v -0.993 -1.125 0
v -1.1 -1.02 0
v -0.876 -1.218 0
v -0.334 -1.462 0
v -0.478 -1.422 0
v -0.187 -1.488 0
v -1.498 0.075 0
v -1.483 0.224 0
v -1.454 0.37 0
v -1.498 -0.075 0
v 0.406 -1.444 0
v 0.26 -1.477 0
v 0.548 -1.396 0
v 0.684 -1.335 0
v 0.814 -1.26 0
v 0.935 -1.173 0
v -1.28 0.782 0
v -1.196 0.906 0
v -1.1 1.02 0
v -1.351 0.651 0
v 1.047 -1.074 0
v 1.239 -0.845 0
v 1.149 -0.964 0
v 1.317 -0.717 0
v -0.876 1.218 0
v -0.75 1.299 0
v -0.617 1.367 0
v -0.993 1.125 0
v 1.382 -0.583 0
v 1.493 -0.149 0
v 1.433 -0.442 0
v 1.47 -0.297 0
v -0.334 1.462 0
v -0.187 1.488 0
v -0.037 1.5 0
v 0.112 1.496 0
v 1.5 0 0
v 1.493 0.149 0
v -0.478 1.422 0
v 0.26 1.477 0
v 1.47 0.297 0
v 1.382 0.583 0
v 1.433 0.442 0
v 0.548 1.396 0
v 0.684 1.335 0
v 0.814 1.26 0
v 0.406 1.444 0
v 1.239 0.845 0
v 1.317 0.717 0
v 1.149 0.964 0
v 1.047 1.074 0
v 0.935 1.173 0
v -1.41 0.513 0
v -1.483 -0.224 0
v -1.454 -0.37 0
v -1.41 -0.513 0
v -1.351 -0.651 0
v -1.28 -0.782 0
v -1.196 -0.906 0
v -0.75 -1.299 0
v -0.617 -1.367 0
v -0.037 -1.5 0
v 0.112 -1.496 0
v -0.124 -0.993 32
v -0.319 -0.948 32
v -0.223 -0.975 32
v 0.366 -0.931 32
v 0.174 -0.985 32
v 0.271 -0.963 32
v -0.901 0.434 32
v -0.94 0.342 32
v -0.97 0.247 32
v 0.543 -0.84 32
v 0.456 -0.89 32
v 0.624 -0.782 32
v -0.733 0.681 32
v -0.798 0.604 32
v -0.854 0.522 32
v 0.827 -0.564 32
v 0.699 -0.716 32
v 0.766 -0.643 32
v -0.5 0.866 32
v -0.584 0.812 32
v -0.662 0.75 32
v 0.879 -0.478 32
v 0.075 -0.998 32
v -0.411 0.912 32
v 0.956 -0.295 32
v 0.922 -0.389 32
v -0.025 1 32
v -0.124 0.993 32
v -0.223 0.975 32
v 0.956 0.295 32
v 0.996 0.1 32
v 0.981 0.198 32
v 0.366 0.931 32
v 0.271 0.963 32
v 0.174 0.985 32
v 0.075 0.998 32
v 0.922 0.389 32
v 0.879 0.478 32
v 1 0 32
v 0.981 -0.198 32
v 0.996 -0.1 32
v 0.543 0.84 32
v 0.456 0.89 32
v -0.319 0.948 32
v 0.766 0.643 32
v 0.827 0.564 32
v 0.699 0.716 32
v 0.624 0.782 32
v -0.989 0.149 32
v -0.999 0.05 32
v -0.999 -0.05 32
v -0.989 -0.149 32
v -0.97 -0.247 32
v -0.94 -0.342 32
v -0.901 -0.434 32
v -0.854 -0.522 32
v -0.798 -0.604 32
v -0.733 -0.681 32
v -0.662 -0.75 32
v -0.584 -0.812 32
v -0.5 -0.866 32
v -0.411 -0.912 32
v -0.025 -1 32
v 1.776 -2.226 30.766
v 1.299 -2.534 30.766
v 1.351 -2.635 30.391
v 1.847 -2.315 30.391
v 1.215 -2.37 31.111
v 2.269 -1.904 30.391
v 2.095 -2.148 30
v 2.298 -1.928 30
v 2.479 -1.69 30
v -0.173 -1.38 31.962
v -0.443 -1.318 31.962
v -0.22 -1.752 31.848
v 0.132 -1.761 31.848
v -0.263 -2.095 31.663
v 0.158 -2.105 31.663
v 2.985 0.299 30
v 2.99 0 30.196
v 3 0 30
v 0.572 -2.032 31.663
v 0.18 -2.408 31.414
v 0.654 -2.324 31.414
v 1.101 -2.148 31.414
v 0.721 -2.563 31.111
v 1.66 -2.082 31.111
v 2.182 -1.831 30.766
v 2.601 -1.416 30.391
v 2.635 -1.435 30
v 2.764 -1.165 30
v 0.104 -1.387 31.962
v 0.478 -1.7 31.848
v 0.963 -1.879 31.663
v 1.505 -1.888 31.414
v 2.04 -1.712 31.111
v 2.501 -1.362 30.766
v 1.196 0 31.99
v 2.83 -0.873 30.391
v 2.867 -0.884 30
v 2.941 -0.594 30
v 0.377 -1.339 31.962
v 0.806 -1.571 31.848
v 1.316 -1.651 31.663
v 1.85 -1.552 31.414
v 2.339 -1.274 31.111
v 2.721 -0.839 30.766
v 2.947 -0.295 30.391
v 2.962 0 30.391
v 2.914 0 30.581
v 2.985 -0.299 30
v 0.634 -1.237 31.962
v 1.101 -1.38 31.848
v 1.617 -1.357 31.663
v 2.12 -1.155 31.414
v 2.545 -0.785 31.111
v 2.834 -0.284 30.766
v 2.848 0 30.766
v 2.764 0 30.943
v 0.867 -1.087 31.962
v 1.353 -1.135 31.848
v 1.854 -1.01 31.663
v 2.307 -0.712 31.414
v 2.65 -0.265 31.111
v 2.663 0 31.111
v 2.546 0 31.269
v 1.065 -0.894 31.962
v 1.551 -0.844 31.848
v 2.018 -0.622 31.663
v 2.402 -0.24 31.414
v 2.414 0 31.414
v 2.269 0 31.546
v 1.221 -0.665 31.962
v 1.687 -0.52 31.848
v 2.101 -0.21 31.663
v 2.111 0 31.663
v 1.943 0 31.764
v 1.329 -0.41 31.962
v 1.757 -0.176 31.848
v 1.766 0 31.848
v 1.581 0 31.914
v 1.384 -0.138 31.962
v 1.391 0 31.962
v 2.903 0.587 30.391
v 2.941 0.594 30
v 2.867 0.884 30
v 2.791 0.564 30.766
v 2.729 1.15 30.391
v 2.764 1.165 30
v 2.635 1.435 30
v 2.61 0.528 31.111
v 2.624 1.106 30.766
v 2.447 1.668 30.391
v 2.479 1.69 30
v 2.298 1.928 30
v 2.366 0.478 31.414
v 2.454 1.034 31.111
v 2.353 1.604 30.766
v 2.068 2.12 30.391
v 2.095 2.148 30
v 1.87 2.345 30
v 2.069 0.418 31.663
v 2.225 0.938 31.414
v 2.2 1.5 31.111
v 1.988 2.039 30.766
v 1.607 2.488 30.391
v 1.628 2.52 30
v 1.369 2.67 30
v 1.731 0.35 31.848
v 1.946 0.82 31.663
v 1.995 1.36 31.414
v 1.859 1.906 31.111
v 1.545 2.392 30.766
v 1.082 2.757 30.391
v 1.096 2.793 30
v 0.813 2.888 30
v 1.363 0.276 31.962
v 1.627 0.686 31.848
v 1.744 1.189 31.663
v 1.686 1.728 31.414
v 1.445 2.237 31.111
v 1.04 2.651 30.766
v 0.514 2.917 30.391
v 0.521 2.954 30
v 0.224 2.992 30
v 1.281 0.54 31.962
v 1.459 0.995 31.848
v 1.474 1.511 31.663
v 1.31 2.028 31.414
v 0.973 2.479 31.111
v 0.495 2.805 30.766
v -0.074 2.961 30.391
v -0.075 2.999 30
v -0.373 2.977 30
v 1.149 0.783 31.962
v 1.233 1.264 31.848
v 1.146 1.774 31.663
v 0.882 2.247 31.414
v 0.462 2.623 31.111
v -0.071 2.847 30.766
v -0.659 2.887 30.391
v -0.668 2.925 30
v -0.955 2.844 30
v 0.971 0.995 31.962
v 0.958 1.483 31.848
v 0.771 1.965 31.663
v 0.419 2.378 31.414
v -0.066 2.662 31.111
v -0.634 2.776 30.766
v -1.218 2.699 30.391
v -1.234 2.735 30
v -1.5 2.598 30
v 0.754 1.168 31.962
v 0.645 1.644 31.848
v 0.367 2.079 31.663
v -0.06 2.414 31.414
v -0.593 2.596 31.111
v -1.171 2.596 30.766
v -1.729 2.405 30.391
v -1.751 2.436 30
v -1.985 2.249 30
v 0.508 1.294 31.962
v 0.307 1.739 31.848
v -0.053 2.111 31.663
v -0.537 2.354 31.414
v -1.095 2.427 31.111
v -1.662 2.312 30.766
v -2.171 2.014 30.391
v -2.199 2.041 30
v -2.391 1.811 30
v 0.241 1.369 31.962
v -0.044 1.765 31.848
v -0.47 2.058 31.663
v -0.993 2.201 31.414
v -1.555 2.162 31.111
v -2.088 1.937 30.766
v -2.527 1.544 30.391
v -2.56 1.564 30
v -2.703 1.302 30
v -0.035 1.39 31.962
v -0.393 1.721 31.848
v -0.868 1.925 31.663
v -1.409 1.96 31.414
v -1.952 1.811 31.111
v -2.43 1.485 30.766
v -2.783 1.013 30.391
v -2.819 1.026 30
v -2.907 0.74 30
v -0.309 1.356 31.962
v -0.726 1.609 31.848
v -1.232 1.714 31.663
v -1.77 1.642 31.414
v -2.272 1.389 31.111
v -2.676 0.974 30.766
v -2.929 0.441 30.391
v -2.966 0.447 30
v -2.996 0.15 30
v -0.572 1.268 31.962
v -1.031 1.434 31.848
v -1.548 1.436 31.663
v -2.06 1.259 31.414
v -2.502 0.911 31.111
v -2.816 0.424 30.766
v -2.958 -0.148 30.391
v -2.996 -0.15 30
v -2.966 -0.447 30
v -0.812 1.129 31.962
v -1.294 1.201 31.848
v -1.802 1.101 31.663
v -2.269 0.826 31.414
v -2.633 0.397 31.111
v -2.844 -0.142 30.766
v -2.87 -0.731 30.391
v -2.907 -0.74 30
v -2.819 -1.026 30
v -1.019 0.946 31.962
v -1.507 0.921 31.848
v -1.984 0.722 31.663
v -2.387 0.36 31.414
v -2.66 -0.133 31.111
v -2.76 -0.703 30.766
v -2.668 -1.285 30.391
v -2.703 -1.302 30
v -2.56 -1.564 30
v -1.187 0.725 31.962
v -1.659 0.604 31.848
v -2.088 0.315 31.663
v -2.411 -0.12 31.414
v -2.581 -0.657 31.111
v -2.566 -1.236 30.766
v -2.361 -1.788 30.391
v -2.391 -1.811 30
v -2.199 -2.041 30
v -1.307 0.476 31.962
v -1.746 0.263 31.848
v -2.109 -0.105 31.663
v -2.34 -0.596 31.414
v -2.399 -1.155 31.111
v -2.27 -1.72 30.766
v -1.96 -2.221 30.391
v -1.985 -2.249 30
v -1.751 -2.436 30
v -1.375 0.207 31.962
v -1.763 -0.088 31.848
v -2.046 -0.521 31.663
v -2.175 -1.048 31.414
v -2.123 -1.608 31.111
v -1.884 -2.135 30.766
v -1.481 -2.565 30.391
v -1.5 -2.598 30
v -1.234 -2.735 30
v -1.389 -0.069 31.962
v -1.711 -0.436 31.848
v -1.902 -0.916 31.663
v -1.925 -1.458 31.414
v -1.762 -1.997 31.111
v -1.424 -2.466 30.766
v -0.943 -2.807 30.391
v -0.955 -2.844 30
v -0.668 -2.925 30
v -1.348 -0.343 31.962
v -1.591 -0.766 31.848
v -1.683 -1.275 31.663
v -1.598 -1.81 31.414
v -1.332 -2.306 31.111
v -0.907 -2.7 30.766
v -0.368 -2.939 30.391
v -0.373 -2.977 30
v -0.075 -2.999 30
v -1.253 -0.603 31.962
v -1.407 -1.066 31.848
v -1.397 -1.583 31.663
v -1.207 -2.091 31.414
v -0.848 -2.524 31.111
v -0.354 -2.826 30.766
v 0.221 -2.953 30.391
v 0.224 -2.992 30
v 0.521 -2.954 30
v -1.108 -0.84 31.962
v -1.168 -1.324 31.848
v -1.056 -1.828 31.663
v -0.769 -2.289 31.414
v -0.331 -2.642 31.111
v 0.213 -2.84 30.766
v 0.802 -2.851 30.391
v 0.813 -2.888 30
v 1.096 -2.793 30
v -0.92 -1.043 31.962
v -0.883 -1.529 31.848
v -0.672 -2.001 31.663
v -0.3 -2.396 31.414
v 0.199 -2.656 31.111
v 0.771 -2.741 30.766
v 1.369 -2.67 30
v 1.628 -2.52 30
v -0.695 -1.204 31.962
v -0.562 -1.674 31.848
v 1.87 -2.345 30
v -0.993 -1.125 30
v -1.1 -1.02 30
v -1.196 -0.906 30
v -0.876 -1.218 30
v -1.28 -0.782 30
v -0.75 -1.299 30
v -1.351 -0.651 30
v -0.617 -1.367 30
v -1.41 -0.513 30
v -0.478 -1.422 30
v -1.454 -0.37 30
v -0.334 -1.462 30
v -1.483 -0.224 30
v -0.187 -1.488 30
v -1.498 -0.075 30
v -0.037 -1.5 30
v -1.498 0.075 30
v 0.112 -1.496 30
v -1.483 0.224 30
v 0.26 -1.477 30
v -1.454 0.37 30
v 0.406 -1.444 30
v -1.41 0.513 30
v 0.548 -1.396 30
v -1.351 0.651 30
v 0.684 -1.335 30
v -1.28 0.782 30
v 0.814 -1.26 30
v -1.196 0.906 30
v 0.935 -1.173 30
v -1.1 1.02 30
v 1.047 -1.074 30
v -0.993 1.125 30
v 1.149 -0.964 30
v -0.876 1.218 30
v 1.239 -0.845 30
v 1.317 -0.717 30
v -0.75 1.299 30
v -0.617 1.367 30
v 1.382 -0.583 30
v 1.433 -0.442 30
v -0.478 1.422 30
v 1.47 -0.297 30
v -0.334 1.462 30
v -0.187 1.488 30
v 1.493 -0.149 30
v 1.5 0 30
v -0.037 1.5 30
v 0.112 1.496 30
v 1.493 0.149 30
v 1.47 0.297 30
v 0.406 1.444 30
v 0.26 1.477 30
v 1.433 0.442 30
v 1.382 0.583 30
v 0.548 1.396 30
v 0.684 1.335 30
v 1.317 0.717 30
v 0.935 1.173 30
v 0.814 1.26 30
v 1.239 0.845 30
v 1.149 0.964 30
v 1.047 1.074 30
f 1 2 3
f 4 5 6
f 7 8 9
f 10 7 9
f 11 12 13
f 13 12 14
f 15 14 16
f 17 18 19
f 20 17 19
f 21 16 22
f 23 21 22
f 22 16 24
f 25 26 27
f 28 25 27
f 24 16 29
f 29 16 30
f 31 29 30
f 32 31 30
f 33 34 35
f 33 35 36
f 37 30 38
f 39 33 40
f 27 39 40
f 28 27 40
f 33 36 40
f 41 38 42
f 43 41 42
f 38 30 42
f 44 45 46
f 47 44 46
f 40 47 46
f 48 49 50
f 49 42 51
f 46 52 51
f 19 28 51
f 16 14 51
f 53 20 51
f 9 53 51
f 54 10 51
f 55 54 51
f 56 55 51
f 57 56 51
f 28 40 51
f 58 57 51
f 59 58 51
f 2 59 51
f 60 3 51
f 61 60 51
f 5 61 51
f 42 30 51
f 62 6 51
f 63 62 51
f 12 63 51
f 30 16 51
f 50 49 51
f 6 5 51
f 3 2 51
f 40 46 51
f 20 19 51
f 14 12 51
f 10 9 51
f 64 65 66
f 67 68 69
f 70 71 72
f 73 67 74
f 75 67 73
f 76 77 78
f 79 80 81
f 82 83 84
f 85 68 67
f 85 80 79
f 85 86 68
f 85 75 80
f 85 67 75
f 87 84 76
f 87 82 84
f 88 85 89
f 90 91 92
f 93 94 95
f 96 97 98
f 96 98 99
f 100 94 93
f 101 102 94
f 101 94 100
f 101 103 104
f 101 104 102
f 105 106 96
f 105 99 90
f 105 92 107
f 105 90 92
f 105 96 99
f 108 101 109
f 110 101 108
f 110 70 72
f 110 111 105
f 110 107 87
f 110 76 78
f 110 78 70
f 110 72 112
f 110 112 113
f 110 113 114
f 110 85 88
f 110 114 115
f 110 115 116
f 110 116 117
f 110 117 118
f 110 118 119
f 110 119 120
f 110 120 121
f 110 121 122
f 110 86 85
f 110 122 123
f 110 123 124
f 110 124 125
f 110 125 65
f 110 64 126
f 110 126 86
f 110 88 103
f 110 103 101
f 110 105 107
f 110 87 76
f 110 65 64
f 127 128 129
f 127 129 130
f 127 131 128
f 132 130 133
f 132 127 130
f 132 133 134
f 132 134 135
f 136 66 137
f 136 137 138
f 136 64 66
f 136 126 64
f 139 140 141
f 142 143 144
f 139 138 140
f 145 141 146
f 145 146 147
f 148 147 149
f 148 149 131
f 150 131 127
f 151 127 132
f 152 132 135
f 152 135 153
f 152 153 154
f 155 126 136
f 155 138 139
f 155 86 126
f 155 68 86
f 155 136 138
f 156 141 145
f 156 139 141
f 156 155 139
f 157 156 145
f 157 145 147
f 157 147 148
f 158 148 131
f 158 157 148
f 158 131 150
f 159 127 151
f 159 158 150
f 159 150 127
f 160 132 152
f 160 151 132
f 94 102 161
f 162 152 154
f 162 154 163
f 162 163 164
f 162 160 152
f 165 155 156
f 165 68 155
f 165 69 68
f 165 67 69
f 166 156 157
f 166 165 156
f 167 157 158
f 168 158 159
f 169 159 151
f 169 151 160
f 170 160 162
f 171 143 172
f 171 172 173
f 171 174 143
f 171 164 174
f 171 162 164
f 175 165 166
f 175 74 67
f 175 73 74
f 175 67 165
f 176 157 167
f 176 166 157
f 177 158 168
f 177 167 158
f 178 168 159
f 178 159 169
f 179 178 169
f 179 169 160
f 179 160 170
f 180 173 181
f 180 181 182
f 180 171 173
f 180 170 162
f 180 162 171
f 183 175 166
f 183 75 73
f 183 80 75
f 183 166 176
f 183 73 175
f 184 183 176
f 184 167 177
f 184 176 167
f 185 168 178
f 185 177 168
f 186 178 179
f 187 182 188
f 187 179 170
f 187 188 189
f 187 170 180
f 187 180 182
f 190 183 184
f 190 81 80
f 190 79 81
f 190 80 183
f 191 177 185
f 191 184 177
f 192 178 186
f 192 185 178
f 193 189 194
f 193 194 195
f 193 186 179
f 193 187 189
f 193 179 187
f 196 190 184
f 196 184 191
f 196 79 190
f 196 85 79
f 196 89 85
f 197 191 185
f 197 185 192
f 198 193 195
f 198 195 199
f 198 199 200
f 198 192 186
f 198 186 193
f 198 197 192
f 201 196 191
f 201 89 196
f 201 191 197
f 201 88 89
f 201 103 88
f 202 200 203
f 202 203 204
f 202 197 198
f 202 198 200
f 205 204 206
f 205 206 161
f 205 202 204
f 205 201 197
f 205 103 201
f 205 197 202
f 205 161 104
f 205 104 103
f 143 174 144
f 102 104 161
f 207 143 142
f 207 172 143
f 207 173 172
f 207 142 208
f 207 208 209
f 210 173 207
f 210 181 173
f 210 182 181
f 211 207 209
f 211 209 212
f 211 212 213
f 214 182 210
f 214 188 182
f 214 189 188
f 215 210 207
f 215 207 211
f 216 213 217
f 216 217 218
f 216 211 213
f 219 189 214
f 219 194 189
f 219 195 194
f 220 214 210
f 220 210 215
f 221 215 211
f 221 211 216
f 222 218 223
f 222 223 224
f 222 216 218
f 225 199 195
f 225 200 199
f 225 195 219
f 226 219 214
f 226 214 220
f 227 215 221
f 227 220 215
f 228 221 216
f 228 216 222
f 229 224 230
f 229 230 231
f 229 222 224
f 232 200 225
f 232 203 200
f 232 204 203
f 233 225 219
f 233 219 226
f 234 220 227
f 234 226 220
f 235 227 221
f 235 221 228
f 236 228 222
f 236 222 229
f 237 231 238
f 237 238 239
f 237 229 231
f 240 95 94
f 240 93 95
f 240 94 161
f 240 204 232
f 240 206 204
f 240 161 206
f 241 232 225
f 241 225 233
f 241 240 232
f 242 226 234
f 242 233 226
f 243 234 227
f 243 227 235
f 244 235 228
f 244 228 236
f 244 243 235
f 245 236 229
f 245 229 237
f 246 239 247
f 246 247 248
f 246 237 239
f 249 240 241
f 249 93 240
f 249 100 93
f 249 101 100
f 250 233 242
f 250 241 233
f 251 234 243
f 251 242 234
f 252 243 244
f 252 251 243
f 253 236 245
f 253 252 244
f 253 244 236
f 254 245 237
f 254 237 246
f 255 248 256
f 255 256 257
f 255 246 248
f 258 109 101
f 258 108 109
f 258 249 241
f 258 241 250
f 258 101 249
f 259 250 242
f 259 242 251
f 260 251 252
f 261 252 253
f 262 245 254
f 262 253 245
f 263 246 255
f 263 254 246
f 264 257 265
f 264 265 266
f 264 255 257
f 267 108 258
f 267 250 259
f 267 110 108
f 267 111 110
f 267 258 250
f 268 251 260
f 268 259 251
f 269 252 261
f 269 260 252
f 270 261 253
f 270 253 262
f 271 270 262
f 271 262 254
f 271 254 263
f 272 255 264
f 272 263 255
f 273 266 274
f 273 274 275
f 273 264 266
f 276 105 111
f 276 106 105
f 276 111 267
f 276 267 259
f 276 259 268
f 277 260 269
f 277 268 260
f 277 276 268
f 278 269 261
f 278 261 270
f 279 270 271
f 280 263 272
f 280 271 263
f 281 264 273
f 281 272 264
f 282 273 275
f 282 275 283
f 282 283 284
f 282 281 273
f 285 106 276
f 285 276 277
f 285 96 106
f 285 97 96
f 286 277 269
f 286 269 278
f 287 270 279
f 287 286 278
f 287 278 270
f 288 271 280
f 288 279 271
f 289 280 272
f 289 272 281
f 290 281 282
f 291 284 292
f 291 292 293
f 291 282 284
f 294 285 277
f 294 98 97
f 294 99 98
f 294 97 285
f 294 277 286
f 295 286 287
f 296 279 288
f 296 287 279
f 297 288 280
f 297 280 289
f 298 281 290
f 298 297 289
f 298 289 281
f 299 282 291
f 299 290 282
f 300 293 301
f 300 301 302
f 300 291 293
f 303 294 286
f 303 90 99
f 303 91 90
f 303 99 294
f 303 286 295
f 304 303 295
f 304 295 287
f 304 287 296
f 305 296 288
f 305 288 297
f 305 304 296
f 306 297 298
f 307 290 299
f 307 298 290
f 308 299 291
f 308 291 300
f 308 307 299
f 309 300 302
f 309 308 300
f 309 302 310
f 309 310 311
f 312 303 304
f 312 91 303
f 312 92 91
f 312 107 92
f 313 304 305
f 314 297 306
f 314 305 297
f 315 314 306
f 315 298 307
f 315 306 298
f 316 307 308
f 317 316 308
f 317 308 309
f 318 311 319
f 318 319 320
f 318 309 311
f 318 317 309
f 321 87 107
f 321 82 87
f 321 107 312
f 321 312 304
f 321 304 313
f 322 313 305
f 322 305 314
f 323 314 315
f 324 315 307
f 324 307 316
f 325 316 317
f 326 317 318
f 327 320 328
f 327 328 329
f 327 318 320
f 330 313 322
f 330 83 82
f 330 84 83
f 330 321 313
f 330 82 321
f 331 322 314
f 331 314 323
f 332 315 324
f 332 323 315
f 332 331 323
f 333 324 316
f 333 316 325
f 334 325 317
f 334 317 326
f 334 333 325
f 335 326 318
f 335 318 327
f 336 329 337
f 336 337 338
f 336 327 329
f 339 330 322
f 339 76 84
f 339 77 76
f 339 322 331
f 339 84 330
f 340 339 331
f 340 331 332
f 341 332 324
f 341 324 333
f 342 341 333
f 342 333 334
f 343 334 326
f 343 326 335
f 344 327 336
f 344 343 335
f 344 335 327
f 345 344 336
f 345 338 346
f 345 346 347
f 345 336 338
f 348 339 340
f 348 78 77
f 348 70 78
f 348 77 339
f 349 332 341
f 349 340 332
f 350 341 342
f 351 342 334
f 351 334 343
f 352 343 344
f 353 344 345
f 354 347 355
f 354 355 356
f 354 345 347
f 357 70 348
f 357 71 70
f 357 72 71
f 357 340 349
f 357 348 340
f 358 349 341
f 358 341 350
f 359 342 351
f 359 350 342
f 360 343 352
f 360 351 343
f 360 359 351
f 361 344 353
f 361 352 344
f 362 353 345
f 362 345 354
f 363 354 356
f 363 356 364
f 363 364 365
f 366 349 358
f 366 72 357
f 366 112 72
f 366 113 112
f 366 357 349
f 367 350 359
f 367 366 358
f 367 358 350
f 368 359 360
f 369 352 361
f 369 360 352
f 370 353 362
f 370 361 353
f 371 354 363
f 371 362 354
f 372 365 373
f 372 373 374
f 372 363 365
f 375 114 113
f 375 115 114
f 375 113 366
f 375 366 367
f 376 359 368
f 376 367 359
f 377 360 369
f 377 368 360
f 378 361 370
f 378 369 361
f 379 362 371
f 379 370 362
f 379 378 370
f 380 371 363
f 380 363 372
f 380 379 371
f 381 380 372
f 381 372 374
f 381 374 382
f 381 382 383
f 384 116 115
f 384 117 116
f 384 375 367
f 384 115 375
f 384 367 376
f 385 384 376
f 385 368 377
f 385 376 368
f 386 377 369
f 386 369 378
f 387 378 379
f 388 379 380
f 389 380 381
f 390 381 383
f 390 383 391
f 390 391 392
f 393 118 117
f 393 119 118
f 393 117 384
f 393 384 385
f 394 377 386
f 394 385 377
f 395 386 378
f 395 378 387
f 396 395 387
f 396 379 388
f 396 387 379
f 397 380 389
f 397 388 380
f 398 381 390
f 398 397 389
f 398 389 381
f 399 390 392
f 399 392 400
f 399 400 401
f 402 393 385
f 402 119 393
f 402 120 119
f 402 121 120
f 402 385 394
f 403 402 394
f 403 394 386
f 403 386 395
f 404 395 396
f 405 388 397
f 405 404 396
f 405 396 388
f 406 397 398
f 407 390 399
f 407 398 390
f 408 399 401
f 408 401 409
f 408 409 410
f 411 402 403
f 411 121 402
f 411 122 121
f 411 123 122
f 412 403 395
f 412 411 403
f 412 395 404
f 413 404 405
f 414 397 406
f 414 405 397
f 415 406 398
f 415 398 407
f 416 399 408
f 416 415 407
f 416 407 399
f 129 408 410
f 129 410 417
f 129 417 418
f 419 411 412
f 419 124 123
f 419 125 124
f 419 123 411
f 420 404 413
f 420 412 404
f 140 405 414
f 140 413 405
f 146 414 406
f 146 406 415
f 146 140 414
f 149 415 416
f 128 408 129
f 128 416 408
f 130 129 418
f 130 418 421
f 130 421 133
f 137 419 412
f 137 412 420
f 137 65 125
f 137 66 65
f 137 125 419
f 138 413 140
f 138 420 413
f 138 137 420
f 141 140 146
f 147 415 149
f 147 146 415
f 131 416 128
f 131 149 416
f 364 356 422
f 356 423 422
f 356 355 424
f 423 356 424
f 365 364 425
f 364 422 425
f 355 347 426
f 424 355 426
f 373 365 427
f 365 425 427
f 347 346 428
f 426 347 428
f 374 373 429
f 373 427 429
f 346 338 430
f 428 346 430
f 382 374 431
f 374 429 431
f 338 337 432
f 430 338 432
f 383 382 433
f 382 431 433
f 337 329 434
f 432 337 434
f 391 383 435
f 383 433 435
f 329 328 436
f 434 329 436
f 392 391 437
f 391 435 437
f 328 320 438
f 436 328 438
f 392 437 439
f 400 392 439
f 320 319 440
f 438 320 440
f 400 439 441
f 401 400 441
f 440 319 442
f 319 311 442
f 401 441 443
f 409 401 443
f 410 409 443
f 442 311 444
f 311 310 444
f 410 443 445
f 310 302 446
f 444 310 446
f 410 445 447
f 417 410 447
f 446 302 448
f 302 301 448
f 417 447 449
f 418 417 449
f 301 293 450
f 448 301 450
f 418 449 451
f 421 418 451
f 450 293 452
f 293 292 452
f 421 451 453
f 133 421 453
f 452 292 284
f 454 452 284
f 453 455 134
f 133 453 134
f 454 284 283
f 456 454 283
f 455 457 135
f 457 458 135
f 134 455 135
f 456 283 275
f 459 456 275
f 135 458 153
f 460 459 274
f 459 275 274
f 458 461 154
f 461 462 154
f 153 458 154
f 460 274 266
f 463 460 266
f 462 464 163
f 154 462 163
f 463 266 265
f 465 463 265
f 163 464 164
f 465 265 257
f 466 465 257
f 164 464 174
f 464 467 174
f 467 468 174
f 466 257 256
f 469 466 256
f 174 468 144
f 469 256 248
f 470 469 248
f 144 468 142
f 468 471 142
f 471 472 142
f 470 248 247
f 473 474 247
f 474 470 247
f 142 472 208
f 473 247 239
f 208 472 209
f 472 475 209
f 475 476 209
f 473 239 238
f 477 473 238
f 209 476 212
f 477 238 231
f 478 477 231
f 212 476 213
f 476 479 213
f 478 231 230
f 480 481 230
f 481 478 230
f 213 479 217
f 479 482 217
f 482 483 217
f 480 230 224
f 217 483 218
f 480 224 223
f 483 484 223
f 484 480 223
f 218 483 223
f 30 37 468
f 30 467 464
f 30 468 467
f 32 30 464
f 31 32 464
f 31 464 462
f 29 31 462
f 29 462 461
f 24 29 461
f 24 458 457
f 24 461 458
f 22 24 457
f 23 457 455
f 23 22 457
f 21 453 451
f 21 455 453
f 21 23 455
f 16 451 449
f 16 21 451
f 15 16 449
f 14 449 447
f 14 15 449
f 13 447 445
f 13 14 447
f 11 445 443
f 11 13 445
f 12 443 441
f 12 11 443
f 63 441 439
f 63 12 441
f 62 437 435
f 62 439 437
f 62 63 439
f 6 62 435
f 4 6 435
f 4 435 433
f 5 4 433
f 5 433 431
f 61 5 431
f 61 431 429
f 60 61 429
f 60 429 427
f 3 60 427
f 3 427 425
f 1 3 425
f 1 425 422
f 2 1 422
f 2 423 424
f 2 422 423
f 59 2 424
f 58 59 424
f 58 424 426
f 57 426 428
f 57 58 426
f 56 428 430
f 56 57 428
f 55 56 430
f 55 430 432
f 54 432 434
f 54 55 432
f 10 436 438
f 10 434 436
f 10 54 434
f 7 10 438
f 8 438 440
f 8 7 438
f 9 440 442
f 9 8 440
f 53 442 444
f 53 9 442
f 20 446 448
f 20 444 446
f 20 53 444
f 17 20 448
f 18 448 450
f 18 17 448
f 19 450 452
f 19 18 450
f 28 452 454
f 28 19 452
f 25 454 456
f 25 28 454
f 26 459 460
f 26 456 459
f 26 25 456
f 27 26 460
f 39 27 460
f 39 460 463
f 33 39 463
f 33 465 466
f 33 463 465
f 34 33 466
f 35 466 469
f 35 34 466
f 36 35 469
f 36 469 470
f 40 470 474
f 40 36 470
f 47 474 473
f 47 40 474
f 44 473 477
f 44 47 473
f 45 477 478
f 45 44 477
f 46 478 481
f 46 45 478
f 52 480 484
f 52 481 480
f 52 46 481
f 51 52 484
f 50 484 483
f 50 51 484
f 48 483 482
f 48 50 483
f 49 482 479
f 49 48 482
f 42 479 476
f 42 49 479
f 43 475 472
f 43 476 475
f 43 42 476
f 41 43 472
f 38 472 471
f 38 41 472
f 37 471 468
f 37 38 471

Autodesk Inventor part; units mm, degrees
ref_plane "YZ Plane" through (0, 0, 0) normal (1, 0, 0) x (0, 1, 0)
ref_plane "XZ Plane" through (0, 0, 0) normal (0, 1, 0) x (-1, 0, 0)
ref_plane "XY Plane" through (0, 0, 0) normal (0, 0, 1) x (1, 0, 0)
sketch "スケッチ1" plane through (0, 0, 0) normal (0, 0, 1) x (1, 0, 0)
  circle A0 centre (0, 0) radius 1.5
  dimension "d0" = 3
extrude "押し出し1" add sketch "スケッチ1" along normal blind 30
sketch "スケッチ2" plane through (0, 0, 30) normal (0, 0, 1) x (1, 0, 0)
  circle A0 centre (0, 0) radius 1.5 projected
  circle A1 centre (0, 0) radius 3
  dimension "d3" = 6
extrude "押し出し2" add sketch "スケッチ2" along normal blind 2 contours A0 | A1
fillet "フィレット1" radius 2 1 edges at (-3, 0, 32)
properties part number "M3ボタンボルト15" material "鋼、高強度、低合金"
